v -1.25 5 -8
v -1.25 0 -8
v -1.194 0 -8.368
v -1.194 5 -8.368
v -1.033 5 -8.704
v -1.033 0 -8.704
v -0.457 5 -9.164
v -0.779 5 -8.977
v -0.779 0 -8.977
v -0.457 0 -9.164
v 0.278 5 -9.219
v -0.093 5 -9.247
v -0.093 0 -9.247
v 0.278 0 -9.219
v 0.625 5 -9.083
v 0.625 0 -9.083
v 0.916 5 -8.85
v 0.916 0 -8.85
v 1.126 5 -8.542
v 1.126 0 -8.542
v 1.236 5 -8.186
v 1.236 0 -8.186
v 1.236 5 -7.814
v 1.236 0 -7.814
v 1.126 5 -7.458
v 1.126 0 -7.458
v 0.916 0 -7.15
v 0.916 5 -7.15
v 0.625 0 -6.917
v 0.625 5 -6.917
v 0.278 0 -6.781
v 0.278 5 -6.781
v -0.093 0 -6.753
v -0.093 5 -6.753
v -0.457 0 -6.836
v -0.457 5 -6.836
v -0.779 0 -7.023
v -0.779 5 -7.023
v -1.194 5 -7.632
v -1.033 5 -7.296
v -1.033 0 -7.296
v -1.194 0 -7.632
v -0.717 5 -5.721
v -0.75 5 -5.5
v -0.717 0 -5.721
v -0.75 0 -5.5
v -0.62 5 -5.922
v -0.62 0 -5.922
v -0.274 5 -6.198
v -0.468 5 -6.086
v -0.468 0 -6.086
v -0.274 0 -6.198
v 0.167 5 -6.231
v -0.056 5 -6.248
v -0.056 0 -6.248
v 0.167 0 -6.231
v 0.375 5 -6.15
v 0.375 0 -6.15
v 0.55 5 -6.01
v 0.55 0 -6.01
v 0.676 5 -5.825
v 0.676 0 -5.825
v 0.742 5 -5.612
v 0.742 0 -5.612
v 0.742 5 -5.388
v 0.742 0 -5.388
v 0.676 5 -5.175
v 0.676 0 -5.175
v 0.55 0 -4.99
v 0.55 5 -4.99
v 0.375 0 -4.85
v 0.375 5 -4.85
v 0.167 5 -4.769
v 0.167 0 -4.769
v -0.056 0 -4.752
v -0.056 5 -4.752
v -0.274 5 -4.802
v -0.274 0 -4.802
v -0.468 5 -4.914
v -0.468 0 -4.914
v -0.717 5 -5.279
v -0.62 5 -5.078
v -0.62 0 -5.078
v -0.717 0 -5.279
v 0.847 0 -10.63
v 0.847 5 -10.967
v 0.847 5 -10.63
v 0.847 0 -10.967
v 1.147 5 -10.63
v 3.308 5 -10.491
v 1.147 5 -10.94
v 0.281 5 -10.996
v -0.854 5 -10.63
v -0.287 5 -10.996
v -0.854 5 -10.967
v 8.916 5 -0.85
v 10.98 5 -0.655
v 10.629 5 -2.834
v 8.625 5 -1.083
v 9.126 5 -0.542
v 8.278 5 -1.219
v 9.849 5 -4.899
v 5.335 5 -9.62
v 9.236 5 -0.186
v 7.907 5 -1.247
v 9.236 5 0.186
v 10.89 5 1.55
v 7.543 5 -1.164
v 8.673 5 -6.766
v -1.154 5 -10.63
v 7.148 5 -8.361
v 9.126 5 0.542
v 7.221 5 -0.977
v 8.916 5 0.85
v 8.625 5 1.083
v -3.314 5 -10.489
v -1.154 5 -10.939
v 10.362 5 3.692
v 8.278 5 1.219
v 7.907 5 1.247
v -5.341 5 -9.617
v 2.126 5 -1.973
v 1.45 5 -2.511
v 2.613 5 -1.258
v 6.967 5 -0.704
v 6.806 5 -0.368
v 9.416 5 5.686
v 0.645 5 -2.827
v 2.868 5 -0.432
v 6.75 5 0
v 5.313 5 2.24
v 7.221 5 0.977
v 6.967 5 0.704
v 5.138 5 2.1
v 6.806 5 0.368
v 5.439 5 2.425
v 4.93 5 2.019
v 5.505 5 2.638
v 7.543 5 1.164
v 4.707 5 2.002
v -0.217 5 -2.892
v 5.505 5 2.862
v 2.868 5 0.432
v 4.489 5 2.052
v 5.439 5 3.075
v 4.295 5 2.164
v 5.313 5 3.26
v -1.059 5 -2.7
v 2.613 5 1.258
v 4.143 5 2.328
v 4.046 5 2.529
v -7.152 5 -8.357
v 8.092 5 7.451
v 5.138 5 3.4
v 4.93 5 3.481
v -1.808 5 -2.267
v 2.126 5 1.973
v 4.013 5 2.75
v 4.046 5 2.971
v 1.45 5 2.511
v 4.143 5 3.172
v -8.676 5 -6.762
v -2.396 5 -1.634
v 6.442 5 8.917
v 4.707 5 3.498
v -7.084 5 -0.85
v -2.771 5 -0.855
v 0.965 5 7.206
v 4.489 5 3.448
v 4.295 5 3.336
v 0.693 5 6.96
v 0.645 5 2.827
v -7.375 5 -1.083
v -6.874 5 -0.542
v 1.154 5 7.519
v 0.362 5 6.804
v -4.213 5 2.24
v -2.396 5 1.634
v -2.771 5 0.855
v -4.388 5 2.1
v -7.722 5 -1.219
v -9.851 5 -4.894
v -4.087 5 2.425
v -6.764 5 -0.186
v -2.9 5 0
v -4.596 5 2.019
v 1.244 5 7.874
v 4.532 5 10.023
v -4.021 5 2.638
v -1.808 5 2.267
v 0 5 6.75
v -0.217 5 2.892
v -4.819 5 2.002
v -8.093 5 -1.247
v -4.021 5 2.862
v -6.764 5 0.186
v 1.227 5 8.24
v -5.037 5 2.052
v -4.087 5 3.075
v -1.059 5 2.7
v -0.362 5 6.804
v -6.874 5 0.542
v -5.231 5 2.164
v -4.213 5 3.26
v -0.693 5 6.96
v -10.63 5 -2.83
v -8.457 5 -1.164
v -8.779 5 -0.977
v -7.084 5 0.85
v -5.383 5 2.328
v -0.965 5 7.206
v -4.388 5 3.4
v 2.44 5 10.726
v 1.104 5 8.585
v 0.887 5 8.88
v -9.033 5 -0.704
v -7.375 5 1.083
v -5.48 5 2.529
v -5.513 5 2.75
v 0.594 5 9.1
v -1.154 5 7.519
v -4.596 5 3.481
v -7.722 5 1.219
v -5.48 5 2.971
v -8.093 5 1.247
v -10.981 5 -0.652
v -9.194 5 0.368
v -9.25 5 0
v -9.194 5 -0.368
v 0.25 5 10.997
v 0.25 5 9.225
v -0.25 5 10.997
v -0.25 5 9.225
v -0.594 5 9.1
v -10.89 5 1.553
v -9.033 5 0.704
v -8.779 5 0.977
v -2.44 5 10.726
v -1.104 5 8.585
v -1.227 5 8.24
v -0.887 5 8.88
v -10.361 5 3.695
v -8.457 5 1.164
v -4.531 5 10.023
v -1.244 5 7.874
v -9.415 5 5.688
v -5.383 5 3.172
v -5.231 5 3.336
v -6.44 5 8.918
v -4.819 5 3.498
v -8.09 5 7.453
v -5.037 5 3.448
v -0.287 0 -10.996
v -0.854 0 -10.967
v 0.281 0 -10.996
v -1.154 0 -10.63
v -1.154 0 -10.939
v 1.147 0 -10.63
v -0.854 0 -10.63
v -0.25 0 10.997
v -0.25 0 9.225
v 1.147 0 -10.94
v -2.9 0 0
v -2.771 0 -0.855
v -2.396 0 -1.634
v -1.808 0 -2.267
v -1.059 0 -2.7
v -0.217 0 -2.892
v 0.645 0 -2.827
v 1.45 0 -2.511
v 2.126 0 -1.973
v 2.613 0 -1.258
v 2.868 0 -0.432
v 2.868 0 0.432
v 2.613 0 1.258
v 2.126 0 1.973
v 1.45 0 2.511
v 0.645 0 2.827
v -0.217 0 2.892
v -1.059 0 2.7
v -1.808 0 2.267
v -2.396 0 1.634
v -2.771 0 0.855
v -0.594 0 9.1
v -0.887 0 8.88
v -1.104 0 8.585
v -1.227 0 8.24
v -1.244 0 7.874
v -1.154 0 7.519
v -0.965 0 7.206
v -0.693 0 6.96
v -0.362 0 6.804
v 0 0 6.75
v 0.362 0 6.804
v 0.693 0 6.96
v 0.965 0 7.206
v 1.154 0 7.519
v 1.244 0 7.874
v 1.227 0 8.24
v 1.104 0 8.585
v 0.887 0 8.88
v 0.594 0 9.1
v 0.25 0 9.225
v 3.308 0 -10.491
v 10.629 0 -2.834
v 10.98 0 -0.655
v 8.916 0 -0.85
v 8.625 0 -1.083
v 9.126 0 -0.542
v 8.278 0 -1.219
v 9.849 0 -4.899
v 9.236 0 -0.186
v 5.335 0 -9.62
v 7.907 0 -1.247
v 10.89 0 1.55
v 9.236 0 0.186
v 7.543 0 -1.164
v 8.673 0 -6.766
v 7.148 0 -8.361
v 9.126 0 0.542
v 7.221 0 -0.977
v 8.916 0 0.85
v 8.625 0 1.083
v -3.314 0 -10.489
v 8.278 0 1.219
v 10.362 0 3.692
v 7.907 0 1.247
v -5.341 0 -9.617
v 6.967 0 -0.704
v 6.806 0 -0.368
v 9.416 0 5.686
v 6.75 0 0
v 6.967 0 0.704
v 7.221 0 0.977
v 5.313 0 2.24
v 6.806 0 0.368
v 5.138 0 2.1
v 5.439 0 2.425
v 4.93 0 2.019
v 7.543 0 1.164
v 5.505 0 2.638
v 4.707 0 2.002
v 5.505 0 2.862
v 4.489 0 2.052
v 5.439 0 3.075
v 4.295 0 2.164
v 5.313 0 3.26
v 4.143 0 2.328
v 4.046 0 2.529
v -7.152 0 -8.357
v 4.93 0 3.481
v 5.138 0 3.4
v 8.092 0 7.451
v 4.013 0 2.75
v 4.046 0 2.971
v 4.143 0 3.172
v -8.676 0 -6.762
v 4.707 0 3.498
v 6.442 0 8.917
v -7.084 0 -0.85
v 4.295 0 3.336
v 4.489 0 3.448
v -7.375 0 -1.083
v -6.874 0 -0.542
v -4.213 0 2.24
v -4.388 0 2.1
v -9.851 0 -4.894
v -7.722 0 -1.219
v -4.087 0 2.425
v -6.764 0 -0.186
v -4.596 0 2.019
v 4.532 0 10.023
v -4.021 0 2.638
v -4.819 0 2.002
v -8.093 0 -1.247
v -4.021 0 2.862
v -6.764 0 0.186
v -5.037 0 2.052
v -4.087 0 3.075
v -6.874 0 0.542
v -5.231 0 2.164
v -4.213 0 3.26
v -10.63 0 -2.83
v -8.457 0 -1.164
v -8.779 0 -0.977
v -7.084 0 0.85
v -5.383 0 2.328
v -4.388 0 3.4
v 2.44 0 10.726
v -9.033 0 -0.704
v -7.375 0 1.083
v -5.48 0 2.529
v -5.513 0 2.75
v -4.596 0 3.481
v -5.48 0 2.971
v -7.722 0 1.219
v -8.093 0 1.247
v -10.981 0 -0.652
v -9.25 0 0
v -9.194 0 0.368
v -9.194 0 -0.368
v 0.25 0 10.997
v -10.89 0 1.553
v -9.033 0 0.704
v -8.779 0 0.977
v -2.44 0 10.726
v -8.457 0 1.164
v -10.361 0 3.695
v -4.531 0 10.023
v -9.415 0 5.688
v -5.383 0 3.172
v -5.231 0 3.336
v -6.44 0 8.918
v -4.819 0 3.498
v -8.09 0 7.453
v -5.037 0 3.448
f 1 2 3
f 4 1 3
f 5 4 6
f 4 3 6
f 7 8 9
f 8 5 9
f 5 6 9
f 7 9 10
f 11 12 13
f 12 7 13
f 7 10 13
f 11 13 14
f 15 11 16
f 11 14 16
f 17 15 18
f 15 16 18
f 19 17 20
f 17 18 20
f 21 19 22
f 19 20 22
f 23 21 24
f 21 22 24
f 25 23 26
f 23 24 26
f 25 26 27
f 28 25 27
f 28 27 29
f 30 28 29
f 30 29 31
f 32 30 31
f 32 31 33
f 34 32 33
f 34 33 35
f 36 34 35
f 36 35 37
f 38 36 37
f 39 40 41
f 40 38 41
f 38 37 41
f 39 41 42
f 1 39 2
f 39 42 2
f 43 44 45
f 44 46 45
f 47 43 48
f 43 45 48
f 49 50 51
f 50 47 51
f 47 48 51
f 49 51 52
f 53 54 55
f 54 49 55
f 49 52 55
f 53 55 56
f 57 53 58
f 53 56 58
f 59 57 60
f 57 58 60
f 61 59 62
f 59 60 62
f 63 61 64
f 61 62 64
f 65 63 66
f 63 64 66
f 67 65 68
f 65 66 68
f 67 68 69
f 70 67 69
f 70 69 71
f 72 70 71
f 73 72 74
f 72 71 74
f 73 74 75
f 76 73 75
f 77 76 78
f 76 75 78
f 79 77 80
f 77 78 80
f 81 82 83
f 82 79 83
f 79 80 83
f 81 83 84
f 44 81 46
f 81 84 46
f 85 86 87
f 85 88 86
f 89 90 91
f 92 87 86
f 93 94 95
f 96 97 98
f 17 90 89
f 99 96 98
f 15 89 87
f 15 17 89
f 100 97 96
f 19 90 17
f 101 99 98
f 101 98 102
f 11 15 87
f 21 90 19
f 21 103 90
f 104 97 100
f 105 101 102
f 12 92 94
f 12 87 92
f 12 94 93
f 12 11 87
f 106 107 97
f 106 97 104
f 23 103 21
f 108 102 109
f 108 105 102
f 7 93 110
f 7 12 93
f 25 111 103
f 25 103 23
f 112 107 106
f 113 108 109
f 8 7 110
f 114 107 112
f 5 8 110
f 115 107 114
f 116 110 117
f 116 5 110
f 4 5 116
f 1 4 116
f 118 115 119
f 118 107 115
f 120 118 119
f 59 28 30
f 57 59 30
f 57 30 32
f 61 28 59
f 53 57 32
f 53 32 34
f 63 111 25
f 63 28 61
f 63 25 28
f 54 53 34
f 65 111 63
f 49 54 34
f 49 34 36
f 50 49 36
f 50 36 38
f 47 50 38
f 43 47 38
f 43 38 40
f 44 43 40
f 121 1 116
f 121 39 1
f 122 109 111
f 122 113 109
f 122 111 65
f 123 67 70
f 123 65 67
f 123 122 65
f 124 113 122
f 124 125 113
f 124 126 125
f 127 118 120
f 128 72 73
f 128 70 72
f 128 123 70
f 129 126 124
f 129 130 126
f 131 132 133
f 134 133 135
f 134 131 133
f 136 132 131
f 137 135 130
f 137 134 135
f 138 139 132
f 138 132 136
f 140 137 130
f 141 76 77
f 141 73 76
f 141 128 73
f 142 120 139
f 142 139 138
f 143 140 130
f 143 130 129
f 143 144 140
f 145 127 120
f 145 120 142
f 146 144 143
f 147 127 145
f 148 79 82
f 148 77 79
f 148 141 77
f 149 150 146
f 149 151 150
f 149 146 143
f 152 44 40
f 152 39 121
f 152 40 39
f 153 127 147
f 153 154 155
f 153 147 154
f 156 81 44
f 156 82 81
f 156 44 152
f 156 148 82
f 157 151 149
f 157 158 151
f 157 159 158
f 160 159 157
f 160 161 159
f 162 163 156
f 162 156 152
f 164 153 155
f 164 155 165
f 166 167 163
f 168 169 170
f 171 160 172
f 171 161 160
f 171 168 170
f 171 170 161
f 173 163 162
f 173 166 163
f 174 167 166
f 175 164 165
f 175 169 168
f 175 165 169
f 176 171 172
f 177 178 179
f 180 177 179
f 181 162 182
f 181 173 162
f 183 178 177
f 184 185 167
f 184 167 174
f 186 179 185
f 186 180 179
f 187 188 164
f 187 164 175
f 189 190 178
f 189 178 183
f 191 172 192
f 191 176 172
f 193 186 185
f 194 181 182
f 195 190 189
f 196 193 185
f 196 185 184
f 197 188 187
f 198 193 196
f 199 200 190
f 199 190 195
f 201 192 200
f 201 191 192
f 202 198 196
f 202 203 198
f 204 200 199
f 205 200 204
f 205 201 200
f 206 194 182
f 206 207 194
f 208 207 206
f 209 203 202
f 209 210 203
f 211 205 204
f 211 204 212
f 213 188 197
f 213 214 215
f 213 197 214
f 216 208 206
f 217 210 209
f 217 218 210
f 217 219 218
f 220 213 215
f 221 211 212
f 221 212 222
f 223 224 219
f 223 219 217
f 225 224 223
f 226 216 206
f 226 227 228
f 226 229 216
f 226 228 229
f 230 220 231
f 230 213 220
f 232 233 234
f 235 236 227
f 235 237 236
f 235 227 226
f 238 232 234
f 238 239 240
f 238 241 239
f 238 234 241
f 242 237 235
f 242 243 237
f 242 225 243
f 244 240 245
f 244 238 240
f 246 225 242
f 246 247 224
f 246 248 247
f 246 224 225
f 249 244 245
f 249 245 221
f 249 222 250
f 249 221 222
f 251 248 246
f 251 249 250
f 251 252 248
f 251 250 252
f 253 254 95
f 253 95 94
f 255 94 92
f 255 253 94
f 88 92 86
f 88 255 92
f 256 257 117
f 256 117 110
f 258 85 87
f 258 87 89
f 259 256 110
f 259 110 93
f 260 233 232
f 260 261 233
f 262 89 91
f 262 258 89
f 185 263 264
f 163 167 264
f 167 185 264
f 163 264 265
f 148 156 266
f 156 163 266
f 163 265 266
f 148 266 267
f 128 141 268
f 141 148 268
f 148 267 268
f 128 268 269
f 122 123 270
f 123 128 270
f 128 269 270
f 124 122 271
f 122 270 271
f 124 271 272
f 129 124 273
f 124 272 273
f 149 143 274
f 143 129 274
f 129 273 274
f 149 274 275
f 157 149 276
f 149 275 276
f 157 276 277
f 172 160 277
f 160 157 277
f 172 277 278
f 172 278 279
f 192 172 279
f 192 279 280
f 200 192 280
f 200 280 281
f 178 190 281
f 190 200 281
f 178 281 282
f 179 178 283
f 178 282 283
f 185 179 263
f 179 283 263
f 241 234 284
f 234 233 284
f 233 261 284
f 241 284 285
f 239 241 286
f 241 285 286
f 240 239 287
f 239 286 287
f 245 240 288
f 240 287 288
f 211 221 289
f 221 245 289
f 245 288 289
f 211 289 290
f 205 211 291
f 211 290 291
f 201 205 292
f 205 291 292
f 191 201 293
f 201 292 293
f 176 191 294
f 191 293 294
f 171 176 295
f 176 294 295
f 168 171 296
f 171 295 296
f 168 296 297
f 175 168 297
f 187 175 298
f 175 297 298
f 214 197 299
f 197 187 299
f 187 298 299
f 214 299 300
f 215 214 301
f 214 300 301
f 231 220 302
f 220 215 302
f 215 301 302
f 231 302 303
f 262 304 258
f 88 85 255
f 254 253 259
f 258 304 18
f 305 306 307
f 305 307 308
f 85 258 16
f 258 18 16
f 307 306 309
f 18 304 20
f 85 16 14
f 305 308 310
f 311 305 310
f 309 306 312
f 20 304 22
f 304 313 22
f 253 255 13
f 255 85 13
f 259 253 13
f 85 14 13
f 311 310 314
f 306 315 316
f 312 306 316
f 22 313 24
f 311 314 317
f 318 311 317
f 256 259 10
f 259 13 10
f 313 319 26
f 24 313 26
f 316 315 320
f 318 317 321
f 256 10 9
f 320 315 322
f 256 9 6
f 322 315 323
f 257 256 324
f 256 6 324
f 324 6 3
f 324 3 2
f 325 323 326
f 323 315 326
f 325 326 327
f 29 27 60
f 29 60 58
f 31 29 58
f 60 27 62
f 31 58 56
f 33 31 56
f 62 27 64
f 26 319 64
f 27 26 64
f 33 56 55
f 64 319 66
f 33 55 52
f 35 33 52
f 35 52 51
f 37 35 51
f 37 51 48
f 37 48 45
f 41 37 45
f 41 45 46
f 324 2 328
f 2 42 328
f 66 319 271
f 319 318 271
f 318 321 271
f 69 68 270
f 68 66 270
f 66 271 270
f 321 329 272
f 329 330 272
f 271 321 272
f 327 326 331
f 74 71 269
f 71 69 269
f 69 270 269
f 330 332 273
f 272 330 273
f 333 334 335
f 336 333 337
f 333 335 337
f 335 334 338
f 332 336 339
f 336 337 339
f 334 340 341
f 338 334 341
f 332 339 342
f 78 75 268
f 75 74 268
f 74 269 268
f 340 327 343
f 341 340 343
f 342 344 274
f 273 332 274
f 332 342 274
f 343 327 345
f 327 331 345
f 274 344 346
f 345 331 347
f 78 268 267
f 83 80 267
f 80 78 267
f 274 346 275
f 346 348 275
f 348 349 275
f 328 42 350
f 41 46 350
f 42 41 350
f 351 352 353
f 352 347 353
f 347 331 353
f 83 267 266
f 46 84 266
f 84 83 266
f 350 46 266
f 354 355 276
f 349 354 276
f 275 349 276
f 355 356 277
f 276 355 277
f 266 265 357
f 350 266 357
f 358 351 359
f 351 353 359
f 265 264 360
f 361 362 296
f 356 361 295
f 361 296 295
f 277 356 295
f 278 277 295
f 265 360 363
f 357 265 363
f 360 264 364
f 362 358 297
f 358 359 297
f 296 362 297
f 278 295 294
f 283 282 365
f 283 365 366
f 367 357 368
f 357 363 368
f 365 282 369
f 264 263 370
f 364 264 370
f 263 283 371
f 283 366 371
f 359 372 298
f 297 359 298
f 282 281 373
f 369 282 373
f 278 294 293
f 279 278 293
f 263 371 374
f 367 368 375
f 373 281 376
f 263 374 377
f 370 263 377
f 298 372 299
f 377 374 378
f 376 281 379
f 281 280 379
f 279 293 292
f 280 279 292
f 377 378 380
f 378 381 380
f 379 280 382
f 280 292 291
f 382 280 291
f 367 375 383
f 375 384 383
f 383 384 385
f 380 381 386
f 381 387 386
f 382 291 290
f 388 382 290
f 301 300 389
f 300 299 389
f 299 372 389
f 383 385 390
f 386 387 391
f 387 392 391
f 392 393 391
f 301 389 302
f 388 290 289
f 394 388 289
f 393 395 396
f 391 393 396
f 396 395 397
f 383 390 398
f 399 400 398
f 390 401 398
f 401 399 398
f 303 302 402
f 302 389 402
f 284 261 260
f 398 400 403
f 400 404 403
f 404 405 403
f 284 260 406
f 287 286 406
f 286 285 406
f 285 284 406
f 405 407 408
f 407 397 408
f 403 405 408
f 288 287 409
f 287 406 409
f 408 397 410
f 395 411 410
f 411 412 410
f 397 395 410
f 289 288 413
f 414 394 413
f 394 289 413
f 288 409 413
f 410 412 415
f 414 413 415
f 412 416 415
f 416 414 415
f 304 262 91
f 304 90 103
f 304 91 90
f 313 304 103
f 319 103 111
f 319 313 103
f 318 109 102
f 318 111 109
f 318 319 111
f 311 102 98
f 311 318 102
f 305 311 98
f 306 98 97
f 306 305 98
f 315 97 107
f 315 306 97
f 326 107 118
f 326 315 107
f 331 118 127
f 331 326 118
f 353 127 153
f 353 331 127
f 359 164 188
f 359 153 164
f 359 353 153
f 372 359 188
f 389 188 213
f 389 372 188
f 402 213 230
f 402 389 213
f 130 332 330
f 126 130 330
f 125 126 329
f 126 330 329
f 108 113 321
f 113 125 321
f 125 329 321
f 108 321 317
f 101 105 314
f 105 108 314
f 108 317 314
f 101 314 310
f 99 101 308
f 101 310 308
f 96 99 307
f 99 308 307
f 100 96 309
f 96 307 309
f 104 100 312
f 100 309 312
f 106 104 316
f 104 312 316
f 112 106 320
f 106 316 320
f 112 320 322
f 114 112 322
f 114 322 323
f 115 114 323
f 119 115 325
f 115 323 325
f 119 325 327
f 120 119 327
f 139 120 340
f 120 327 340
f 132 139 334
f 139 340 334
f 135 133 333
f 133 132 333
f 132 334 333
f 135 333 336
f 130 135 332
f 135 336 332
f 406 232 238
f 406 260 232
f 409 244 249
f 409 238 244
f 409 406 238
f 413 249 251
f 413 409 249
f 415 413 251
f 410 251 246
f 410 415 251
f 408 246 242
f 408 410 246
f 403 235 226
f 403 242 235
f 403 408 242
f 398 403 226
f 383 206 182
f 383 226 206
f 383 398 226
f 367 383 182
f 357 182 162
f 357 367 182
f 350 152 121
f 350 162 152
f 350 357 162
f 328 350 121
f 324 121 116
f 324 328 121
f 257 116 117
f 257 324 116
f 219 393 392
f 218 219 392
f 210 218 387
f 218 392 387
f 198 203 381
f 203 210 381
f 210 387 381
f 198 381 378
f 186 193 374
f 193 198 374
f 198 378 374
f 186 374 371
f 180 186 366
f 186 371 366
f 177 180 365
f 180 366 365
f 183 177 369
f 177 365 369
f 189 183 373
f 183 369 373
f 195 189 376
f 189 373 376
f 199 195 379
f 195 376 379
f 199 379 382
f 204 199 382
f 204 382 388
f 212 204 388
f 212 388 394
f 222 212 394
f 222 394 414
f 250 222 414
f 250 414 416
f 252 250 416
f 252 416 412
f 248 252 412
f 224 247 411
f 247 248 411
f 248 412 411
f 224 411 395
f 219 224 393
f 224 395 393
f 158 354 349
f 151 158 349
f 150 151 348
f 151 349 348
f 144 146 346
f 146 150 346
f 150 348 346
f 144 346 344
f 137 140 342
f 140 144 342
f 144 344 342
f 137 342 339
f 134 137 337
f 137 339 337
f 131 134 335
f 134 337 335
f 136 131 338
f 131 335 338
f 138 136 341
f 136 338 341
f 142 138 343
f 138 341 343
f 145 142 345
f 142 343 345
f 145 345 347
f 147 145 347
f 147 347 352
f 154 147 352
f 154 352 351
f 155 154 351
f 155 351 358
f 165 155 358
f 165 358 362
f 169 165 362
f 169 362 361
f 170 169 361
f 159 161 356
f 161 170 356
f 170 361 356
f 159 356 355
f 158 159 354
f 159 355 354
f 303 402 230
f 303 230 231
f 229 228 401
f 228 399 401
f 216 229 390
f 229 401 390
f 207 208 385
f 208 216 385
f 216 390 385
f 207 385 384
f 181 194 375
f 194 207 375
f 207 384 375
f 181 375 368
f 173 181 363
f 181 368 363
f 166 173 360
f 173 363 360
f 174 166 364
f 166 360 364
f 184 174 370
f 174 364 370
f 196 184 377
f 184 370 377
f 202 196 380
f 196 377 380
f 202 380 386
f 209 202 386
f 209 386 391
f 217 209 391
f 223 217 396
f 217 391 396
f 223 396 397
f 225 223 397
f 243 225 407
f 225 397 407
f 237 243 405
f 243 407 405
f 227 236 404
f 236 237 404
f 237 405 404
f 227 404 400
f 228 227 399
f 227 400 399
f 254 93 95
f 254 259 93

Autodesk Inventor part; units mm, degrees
ref_plane "YZ Plane" through (0, 0, 0) normal (1, 0, 0) x (0, 1, 0)
ref_plane "XZ Plane" through (0, 0, 0) normal (0, 1, 0) x (-1, 0, 0)
ref_plane "XY Plane" through (0, 0, 0) normal (0, 0, 1) x (1, 0, 0)
sketch "Эскиз1" plane through (0, 0, 0) normal (0, 1, 0) x (-1, 0, 0)
  arc A0 (-0.25, 9.2247) -> (0.25, 9.2247) centre (0, 8) ccw
  line L0 (-0.25, 10.9972) -> (-0.25, 9.2247)
  arc A1 (-0.25, 10.9972) -> (-1.1469, -10.94) centre (0, 0) ccw
  line L1 (-1.1469, -10.6297) -> (-1.1469, -10.94)
  line L2 (-0.8473, -10.6297) -> (-1.1469, -10.6297)
  line L3 (-0.8473, -10.9673) -> (-0.8473, -10.6297)
  arc A2 (-0.8473, -10.9673) -> (0.8535, -10.9668) centre (0, 0) ccw
  line L4 (0.8535, -10.6297) -> (0.8535, -10.9668)
  line L5 (1.1541, -10.6297) -> (0.8535, -10.6297)
  line L6 (1.1541, -10.9393) -> (1.1541, -10.6297)
  arc A3 (1.1541, -10.9393) -> (0.25, 10.9972) centre (0, 0) ccw
  line L7 (0.25, 9.2247) -> (0.25, 10.9972)
  circle A4 centre (8, 0) radius 1.25
  circle A5 centre (0, -8) radius 1.25
  circle A6 centre (-8, 0) radius 1.25
  circle A7 centre (0, -5.5) radius 0.75
  circle A8 centre (4.7631, 2.75) radius 0.75
  circle A9 centre (-4.7631, 2.75) radius 0.75
  circle A10 centre (0, 0) radius 2.9
  arc A11 (0.25, 9.2247) -> (-0.25, 9.2247) centre (0, 8) ccw
extrude "Выдавливание1" add sketch "Эскиз1" along normal blind 5 contours A0 L7 A3 L6 L5 L4 A2 L3 L2 L1 A1 L0
properties part number "проставка"
